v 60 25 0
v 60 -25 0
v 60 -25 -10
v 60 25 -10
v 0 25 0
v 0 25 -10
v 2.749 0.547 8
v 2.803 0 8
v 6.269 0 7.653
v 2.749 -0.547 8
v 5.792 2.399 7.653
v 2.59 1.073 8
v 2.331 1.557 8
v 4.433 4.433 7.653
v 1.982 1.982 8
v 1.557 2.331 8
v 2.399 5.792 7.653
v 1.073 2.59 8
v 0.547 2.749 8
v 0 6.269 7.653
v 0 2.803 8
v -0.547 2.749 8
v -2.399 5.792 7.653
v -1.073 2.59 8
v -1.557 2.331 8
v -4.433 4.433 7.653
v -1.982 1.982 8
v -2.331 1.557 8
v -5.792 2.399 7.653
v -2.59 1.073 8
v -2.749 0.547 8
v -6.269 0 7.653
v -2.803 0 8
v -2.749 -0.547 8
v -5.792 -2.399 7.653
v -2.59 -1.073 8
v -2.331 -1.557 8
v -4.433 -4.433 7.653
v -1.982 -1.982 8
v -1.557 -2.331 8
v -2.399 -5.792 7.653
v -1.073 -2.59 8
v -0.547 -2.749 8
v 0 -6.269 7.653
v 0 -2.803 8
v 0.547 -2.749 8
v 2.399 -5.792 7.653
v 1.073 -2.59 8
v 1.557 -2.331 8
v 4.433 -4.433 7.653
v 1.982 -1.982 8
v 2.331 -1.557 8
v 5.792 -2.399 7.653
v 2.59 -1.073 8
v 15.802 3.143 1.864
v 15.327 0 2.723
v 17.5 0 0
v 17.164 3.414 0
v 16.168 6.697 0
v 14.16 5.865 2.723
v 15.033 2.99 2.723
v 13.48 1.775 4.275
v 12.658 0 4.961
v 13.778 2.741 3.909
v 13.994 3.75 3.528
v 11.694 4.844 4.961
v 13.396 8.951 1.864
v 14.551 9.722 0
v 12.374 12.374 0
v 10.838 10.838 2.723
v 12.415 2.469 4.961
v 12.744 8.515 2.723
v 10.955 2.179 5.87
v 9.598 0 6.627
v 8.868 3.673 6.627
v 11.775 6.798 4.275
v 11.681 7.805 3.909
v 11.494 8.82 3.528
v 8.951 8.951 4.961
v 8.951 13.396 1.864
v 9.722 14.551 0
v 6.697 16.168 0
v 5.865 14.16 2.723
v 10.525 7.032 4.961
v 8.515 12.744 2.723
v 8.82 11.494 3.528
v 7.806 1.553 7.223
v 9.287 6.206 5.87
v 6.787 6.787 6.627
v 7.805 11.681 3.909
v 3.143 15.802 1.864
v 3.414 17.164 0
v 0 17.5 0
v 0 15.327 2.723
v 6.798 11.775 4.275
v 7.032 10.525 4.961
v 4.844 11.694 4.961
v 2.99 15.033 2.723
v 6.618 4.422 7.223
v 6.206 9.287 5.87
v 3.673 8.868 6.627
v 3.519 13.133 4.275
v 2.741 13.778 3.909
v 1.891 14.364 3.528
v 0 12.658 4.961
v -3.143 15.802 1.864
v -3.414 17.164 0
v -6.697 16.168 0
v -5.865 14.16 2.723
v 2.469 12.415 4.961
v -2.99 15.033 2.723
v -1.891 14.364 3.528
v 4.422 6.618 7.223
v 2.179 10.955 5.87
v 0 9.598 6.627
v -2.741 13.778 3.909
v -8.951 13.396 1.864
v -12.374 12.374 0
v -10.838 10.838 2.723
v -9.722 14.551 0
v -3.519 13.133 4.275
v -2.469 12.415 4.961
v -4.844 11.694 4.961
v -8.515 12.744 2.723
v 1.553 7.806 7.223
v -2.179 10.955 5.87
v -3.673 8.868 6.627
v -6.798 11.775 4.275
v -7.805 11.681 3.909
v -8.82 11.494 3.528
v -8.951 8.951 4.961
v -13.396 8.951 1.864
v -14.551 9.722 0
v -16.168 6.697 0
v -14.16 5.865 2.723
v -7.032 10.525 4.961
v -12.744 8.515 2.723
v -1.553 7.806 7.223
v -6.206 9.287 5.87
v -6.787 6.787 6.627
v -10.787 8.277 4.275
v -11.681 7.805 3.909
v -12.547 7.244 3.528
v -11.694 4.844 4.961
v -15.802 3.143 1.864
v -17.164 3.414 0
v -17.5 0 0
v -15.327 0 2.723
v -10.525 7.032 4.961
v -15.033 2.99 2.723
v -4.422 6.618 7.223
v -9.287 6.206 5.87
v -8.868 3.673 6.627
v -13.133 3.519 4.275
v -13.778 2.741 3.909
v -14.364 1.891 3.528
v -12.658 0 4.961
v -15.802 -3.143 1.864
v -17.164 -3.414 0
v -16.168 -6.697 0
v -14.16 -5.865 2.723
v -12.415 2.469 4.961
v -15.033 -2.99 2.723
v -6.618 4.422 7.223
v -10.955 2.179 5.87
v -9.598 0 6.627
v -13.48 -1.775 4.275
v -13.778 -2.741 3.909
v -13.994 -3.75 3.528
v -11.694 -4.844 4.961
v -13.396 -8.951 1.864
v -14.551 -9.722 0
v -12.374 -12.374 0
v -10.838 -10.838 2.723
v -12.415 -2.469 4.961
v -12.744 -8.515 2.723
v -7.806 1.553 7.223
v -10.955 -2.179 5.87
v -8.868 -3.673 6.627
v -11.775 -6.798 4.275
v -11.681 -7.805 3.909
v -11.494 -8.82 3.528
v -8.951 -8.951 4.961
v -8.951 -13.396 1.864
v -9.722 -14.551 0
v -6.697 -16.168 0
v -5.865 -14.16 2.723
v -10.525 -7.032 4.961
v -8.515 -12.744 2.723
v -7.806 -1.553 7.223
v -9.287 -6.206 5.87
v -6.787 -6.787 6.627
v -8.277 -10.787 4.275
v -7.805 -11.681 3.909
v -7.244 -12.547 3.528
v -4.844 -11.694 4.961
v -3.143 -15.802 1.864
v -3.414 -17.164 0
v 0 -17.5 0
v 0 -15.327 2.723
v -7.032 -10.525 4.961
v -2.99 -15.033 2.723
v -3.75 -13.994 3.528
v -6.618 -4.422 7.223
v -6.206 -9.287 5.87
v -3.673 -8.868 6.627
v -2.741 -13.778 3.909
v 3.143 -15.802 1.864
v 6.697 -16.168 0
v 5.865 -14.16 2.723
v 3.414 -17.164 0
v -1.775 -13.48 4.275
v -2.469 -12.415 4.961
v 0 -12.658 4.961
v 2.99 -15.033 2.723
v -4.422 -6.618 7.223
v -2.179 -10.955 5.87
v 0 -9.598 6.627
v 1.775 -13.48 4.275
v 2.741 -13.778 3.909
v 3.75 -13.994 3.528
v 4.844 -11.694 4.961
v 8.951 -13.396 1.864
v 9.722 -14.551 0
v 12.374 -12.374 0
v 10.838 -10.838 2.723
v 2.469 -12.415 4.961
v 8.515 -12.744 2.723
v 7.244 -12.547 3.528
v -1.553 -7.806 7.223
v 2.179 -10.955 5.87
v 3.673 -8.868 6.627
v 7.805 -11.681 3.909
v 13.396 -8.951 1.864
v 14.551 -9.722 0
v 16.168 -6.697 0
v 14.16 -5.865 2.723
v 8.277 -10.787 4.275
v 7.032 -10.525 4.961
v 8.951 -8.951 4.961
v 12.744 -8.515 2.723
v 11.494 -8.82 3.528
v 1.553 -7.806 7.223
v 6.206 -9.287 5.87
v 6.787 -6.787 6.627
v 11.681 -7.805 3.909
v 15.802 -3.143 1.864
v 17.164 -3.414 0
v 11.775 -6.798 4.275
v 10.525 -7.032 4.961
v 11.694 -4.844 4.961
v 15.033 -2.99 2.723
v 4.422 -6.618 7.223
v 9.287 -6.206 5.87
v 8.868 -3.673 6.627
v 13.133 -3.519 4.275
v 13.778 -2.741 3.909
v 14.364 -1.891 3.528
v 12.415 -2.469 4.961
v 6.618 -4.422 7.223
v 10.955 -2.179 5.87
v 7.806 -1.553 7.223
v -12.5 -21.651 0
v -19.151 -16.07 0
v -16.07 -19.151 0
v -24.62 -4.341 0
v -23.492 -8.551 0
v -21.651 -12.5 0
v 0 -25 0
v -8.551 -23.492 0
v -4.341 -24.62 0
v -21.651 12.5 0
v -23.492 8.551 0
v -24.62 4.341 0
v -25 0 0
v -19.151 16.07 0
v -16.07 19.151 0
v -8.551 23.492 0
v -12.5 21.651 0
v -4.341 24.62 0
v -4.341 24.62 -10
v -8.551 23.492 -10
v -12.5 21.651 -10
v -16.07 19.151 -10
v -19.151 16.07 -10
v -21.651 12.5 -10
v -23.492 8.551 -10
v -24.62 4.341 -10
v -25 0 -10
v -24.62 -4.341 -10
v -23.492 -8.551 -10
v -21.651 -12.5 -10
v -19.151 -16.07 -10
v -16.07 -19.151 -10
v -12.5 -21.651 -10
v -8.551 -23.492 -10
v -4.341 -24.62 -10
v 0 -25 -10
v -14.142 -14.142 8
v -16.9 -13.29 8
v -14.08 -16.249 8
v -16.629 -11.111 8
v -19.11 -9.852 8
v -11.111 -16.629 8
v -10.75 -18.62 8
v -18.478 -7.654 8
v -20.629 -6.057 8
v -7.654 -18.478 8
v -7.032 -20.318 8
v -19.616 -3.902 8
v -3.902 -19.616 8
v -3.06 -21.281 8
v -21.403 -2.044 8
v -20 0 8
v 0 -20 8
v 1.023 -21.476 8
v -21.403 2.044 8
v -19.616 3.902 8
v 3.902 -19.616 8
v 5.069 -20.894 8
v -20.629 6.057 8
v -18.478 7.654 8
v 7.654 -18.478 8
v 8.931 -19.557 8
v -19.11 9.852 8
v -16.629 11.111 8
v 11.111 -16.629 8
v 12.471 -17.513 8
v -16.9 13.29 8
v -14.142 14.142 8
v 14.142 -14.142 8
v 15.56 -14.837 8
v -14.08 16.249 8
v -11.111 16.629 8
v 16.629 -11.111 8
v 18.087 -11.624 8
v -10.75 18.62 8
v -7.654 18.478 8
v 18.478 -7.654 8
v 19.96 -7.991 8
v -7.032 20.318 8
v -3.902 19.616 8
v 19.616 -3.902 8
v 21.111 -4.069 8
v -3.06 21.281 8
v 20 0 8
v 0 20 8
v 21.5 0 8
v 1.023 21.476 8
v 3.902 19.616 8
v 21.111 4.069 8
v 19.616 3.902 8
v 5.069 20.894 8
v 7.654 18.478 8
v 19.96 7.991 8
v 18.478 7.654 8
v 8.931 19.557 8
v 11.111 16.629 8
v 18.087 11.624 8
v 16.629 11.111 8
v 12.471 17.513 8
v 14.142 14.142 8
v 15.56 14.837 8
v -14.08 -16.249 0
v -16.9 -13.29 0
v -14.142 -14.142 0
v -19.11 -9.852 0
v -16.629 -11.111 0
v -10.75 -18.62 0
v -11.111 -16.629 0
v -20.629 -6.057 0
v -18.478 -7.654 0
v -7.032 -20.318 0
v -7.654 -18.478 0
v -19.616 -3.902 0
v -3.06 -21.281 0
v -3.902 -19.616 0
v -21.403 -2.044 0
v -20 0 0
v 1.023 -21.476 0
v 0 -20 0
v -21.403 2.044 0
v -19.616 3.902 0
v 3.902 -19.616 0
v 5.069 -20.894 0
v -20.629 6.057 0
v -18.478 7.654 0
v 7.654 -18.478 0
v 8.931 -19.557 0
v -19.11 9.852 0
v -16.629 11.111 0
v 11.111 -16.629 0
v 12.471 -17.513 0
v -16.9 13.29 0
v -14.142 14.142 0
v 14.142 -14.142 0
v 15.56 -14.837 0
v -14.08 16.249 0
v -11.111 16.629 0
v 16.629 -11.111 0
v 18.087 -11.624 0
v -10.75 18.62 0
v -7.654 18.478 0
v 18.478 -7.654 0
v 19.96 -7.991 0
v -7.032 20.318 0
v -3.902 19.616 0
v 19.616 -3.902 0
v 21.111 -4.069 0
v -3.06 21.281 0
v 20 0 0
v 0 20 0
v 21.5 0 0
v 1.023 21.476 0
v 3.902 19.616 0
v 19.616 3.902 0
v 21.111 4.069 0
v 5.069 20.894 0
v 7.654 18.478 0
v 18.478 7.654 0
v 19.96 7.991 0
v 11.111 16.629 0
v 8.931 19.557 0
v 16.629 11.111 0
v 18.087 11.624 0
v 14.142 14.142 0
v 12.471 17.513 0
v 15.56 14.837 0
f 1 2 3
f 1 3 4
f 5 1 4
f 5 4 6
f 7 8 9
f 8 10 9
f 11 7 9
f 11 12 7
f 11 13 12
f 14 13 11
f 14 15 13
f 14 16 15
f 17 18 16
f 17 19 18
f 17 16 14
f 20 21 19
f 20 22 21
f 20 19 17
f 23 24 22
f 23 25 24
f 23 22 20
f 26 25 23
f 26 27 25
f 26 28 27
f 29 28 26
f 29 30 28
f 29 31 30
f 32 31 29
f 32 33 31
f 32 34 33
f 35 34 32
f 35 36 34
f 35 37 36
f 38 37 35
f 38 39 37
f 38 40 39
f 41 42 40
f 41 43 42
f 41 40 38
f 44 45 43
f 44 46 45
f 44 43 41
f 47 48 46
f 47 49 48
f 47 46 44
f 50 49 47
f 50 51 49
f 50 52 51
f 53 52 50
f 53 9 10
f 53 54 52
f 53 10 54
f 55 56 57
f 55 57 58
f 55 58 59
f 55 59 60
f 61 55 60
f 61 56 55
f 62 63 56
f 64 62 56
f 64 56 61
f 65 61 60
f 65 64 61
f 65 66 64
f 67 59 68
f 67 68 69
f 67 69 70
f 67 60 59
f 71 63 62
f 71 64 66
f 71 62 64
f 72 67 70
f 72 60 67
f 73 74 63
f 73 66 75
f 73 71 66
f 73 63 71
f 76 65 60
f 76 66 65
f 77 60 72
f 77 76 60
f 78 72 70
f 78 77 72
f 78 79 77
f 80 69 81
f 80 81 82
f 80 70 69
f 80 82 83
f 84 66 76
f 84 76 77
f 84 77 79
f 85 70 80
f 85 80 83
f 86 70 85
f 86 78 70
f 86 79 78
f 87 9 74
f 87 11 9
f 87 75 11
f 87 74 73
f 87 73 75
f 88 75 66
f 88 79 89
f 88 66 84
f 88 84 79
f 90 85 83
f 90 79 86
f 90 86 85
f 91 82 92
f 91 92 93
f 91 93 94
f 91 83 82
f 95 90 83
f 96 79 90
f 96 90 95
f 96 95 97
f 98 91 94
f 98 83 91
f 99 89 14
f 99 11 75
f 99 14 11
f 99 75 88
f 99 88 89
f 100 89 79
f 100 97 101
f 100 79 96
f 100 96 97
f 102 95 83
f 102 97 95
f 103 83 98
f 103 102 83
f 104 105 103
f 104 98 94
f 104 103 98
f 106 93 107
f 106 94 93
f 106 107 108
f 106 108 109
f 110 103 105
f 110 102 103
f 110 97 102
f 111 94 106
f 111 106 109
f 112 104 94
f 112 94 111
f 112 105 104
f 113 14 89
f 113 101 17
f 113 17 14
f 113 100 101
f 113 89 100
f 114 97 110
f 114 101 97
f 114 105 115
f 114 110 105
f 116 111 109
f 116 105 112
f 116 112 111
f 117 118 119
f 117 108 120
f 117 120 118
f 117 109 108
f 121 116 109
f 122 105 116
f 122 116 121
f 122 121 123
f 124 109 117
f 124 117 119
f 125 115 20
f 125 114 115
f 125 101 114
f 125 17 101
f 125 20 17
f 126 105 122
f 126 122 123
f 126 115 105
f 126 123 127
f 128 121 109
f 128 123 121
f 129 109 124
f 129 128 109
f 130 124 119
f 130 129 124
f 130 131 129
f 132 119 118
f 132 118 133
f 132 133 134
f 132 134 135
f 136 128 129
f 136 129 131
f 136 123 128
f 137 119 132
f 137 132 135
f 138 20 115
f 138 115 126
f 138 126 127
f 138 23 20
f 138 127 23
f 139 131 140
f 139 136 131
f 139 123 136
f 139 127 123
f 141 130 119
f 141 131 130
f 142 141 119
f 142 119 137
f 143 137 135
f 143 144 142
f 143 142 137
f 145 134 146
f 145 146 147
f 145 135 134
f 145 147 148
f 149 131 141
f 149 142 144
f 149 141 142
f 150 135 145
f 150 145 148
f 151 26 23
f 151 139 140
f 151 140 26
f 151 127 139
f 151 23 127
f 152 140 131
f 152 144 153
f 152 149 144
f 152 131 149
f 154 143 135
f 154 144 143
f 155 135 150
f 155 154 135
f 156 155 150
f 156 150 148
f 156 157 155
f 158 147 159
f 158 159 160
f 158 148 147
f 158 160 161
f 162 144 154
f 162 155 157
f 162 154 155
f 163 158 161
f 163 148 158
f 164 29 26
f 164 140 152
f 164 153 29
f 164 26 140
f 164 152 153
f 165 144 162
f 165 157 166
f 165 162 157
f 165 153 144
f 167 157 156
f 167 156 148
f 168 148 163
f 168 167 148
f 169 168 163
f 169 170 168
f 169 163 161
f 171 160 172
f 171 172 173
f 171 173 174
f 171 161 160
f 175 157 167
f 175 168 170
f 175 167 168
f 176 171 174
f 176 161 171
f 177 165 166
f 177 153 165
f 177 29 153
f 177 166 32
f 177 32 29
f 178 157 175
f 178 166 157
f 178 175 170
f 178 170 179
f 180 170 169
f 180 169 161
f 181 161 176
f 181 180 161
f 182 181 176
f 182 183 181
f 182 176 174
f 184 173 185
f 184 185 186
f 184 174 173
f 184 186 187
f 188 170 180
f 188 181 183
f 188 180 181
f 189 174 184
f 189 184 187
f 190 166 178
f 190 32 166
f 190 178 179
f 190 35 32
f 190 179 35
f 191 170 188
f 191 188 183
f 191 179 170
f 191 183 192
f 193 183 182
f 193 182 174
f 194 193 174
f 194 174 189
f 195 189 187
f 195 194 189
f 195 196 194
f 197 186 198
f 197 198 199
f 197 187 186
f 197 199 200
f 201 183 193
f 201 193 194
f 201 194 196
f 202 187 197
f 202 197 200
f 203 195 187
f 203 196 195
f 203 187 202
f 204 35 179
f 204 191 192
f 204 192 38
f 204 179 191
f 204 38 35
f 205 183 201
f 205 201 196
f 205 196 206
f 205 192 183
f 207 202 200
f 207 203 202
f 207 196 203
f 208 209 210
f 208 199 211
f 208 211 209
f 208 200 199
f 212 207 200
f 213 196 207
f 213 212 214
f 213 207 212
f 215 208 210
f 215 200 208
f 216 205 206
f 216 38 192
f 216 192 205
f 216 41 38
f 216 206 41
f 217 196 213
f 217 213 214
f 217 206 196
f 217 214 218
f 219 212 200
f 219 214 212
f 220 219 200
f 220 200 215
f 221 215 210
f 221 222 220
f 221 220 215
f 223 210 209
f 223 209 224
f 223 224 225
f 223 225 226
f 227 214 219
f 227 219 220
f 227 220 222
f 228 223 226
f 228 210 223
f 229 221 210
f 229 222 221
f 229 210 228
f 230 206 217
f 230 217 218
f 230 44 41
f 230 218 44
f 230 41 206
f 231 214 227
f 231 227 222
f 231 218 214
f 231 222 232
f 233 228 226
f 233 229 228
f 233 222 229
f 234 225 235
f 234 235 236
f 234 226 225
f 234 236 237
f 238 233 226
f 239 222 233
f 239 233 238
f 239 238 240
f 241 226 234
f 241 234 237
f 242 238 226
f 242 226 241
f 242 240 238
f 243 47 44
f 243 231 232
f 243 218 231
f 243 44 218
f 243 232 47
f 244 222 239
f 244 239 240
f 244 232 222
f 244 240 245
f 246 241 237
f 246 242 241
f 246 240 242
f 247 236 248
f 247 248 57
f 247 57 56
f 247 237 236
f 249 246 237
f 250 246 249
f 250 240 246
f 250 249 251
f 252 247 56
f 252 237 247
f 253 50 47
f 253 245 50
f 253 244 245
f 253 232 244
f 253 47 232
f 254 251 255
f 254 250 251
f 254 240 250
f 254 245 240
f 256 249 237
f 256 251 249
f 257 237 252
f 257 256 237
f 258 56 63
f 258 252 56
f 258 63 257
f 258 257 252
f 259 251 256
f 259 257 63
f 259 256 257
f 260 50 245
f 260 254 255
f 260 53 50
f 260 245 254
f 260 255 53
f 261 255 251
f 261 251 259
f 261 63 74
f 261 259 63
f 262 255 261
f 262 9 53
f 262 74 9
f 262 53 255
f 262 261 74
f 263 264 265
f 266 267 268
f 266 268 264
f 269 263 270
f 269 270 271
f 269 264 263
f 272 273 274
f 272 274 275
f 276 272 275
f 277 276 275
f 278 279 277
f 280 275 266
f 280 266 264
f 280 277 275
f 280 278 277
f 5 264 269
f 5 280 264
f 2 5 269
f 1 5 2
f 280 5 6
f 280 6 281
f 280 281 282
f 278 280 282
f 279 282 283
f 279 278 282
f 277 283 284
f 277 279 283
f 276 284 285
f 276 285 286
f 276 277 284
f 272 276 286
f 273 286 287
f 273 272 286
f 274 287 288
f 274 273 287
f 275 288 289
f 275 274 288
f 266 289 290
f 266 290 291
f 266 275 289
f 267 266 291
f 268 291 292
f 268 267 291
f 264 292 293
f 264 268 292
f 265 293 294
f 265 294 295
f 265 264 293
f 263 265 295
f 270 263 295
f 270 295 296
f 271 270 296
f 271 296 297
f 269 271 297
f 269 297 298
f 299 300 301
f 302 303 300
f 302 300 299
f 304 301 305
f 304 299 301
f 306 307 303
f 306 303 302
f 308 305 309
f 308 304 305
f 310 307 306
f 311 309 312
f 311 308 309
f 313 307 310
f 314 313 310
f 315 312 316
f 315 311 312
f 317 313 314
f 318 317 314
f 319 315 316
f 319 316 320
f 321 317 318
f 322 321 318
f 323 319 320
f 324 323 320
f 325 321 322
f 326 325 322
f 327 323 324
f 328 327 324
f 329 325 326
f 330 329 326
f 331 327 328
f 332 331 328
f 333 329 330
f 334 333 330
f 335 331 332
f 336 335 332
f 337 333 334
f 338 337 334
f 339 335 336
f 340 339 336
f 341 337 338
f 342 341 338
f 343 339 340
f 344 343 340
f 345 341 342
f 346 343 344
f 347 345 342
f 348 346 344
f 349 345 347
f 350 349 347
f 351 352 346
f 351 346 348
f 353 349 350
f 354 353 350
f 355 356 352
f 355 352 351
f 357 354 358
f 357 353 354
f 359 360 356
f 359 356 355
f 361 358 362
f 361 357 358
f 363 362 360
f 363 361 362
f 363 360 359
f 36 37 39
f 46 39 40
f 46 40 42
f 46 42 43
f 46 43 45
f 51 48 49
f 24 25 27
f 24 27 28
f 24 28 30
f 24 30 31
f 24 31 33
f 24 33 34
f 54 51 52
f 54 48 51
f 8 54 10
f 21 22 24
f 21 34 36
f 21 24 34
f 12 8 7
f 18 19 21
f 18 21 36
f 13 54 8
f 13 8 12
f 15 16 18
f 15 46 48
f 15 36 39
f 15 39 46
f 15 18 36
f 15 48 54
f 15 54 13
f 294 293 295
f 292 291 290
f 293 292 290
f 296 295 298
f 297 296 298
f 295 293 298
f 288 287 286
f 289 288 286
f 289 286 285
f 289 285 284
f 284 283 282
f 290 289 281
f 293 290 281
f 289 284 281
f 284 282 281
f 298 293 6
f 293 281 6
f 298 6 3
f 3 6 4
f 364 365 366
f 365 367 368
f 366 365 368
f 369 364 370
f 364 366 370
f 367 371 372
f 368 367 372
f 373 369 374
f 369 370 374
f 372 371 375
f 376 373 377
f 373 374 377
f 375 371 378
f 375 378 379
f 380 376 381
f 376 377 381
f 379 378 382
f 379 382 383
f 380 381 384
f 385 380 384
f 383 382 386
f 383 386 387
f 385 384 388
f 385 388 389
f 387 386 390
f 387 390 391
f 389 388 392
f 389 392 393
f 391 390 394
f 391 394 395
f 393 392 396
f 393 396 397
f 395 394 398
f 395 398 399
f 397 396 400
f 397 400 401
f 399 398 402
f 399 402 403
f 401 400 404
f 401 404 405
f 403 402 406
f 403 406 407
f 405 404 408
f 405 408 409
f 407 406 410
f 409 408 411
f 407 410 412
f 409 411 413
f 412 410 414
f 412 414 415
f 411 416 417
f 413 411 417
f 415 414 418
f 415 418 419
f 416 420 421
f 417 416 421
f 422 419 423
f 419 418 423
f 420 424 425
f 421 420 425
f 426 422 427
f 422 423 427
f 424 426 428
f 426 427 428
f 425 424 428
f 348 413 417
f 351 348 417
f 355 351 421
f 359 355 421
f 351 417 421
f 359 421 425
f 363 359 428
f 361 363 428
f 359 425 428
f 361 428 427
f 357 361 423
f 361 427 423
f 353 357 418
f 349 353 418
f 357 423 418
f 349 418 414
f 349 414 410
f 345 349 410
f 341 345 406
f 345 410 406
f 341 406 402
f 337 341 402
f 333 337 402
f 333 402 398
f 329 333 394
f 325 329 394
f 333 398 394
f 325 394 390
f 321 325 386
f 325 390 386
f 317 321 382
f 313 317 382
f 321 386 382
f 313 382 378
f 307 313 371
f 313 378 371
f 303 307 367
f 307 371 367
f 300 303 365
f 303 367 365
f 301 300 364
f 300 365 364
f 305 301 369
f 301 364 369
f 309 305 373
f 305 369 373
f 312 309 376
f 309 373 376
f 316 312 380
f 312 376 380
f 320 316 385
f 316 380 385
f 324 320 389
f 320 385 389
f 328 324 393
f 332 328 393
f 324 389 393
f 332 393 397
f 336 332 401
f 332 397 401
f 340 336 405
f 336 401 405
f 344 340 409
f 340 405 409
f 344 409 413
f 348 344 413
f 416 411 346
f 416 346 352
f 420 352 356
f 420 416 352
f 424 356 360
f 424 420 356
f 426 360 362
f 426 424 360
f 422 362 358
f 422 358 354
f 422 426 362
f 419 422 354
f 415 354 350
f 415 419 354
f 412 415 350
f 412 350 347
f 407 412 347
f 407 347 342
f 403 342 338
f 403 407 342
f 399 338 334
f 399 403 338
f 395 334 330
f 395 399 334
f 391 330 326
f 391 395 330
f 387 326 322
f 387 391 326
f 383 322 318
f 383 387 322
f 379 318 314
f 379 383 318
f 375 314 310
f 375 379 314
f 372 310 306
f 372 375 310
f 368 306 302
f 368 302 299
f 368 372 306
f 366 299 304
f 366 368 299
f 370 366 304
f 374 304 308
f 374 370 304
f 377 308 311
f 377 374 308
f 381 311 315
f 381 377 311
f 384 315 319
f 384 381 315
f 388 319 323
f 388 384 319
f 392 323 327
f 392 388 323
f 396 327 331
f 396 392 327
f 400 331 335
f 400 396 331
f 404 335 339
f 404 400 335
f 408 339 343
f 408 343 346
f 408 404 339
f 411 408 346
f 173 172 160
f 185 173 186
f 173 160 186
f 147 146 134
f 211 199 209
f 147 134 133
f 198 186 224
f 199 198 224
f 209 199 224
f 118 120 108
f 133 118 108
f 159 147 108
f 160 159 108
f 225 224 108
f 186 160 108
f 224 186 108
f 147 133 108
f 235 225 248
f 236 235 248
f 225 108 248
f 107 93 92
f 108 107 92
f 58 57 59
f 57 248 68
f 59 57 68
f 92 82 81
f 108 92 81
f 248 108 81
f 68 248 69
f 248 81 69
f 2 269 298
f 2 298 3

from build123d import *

# Parameters (mm, degrees)
F0_R     = 21.5
F0_R_2   = 20
F0_R_3   = 17.5
F1_DEPTH = 10
F2_DEPTH = 8
F3_DEPTH = 8


# Not quite as in the source:
# - a fillet or chamfer that OpenCascade refuses, or shapes differently, is made with other operations: its cross-section is extruded or revolved along the edge and cut away or added


with BuildPart() as f1:
    # F0 (on Top) → F1 (new body)
    with BuildSketch(Plane.XY):
        with BuildLine():
            Line((60, 25), (0, 25))
            ThreePointArc((0, 25), (-25, 0), (0, -25))
            Line((0, -25), (60, -25))
            Line((60, -25), (60, 25))
        make_face()
        Circle(F0_R, mode=Mode.SUBTRACT)
        Circle(F0_R)
        Circle(F0_R_2, mode=Mode.SUBTRACT)
        Circle(F0_R_2)
        Circle(F0_R_3, mode=Mode.SUBTRACT)
        Circle(F0_R_3)
    extrude(amount=-F1_DEPTH)


with BuildPart() as f2:
    # F0 (on Top) → F2 (new body)
    with BuildSketch(Plane.XY):
        Circle(F0_R)
        Circle(F0_R_2, mode=Mode.SUBTRACT)
    extrude(amount=F2_DEPTH)


with BuildPart() as f3:
    # F0 (on Top) → F3 (new body)
    with BuildSketch(Plane.XY):
        Circle(F0_R_3)
    extrude(amount=F3_DEPTH)

    # F4: fillet of radius 17.5 on 1 edges, made by hand

    # F4_s1 → F4_t2 (revolve, cut)
    with BuildSketch(Plane.XZ):
        with BuildLine():
            ThreePointArc((17.5, 0), (11.1696618086, 5.8704261489), (2.8030615433, 8))
            Line((2.8030615433, 8), (17.5, 8))
            Line((17.5, 8), (17.5, 0))
        make_face()
    revolve(axis=Axis((0, 0, 8), (0, 0, 1)), mode=Mode.SUBTRACT)


solid = Compound([f1.part, f2.part, f3.part])
